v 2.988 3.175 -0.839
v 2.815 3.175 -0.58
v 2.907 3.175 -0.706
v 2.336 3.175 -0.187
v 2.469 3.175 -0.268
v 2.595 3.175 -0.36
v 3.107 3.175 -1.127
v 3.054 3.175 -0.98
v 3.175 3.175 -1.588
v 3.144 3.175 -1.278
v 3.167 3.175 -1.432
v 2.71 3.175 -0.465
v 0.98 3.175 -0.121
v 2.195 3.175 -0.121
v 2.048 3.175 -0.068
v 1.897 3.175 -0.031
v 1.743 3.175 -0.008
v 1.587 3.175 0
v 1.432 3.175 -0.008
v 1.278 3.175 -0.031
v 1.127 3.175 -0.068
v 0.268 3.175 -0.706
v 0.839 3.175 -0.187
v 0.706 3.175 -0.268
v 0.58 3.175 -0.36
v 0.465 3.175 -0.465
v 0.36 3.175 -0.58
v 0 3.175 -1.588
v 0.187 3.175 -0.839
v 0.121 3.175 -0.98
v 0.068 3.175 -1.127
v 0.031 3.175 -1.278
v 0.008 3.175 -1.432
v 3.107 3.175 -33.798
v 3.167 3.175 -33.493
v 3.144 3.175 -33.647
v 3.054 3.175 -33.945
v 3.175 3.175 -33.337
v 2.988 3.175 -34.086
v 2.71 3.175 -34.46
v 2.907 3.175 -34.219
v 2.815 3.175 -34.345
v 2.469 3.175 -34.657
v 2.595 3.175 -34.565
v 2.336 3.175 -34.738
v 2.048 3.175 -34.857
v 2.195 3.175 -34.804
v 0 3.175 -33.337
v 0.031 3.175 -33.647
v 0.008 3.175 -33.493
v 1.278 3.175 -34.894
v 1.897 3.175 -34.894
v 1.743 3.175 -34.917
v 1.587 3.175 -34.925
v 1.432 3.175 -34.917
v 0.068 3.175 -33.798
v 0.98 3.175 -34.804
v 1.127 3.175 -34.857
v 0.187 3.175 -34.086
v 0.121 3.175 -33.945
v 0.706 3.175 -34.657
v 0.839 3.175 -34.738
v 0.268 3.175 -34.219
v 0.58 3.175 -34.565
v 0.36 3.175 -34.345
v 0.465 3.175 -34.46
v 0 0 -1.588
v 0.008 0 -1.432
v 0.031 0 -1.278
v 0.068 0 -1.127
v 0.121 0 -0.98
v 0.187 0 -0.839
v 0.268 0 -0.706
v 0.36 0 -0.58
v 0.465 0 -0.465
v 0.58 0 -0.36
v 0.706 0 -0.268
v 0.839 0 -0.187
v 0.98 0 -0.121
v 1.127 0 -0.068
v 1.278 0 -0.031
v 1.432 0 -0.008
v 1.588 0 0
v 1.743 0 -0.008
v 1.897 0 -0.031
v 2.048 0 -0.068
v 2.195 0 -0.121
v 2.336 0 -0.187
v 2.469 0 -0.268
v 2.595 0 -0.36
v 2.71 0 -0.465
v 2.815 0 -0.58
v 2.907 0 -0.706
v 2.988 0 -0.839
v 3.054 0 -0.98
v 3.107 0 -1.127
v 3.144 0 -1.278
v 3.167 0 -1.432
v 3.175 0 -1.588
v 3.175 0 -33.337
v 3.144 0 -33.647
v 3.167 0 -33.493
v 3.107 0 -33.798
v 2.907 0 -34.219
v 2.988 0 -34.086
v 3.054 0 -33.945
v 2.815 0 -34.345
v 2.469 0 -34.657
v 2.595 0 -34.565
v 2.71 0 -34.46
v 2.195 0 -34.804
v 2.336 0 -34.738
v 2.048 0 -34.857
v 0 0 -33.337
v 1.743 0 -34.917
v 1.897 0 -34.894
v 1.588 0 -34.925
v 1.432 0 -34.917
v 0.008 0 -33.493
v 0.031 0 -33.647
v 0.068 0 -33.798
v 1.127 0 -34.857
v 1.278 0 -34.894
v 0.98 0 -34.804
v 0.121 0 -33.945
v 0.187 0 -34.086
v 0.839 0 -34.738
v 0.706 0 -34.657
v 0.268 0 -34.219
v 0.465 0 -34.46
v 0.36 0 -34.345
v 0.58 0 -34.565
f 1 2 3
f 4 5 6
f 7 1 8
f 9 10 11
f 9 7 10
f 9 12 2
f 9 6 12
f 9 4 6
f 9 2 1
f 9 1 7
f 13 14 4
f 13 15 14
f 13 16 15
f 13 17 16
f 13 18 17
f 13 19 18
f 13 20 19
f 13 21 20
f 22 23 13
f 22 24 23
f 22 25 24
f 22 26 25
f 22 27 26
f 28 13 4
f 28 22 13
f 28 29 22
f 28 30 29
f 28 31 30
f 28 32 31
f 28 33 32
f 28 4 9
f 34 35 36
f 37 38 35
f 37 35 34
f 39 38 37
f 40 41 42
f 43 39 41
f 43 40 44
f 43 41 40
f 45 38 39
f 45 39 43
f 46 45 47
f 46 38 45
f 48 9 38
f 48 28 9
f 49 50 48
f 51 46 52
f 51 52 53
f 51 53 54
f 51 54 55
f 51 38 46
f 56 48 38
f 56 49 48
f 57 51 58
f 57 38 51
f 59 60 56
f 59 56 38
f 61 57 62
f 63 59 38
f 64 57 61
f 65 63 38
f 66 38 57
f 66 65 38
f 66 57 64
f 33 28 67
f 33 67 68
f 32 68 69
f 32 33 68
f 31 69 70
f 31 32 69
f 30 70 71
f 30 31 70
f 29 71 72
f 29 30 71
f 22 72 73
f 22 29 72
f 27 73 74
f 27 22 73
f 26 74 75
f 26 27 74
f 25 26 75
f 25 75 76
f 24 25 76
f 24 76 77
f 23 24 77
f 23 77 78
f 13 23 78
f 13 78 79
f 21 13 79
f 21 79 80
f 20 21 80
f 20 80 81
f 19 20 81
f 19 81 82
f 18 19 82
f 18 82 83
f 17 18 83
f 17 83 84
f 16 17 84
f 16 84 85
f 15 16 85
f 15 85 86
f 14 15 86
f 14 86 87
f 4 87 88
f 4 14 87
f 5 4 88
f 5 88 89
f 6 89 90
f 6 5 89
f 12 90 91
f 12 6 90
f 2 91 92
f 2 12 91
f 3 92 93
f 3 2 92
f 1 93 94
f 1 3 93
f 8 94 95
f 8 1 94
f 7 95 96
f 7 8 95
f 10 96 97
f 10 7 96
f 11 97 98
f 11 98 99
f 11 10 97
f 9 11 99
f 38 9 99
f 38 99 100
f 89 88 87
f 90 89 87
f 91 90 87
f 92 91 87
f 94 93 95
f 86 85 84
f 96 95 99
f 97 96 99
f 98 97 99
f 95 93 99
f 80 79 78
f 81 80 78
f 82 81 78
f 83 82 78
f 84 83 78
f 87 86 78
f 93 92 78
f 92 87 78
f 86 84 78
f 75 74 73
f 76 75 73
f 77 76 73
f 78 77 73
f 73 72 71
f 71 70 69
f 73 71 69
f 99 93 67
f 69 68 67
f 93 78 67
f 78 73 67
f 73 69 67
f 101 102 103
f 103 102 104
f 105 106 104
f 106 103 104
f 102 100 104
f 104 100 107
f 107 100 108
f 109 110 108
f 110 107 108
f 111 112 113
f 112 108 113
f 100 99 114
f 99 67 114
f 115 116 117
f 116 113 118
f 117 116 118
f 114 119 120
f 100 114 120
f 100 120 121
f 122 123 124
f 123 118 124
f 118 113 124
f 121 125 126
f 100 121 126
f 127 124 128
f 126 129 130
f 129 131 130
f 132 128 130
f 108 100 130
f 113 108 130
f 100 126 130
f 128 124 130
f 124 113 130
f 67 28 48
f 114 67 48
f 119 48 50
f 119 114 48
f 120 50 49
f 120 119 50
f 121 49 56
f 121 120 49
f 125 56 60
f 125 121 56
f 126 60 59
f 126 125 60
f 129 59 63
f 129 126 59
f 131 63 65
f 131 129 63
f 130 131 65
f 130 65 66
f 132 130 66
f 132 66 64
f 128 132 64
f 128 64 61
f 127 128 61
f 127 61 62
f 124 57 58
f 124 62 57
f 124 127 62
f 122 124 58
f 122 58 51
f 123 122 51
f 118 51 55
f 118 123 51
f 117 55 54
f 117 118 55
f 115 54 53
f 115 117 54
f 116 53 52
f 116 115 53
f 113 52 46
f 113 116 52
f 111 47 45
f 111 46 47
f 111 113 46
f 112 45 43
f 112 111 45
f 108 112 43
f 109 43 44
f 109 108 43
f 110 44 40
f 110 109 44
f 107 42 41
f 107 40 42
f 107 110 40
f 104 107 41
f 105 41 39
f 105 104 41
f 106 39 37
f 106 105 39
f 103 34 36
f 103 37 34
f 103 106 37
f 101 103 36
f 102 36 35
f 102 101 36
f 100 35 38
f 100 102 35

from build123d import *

# Parameters (mm, degrees)
SKETCH1_W           = 34.925
SKETCH1_H           = 3.175
BOSS_EXTRUDE1_DEPTH = 3.175
FILLET1_RADIUS      = 1.5875
FILLET1_LENGTH      = 3.175
FILLET2_RADIUS      = 1.5875
FILLET2_LENGTH      = 3.175


with BuildPart() as part:
    # Sketch1 → Boss-Extrude1 (new body)
    with BuildSketch(Plane(origin=(0, 0, 0), x_dir=(0, 0, -1), z_dir=(1, 0, 0))):
        with Locations((17.4625, 1.5875)):
            Rectangle(SKETCH1_W, SKETCH1_H)
    extrude(amount=BOSS_EXTRUDE1_DEPTH)

    # Fillet1: full round fillet: the end face becomes a half cylinder, R = half its width
    fillet1_face = Plane((1.5875, 1.5875, 0), x_dir=(0, 1, 0), z_dir=(0, 0, 1))  # on the end face: x along it, z out of the body
    fillet1_slab = fillet1_face.offset(-FILLET1_RADIUS / 2) * Box(FILLET1_LENGTH, 2 * FILLET1_RADIUS, FILLET1_RADIUS, mode=Mode.PRIVATE)  # the body's end, R deep
    fillet1_round = Plane((1.5875, 1.5875, -1.5875), x_dir=(0, 0, 1), z_dir=(0, 1, 0)) * Cylinder(FILLET1_RADIUS, FILLET1_LENGTH, mode=Mode.PRIVATE)  # its axis R under the face
    add(fillet1_slab - fillet1_round, mode=Mode.SUBTRACT)

    # Fillet2: full round fillet: the end face becomes a half cylinder, R = half its width
    fillet2_face = Plane((1.5875, 1.5875, -34.925), x_dir=(0, -1, 0), z_dir=(0, 0, -1))  # on the end face: x along it, z out of the body
    fillet2_slab = fillet2_face.offset(-FILLET2_RADIUS / 2) * Box(FILLET2_LENGTH, 2 * FILLET2_RADIUS, FILLET2_RADIUS, mode=Mode.PRIVATE)  # the body's end, R deep
    fillet2_round = Plane((1.5875, 1.5875, -33.3375), x_dir=(0, 0, -1), z_dir=(0, -1, 0)) * Cylinder(FILLET2_RADIUS, FILLET2_LENGTH, mode=Mode.PRIVATE)  # its axis R under the face
    add(fillet2_slab - fillet2_round, mode=Mode.SUBTRACT)


solid = part.part
